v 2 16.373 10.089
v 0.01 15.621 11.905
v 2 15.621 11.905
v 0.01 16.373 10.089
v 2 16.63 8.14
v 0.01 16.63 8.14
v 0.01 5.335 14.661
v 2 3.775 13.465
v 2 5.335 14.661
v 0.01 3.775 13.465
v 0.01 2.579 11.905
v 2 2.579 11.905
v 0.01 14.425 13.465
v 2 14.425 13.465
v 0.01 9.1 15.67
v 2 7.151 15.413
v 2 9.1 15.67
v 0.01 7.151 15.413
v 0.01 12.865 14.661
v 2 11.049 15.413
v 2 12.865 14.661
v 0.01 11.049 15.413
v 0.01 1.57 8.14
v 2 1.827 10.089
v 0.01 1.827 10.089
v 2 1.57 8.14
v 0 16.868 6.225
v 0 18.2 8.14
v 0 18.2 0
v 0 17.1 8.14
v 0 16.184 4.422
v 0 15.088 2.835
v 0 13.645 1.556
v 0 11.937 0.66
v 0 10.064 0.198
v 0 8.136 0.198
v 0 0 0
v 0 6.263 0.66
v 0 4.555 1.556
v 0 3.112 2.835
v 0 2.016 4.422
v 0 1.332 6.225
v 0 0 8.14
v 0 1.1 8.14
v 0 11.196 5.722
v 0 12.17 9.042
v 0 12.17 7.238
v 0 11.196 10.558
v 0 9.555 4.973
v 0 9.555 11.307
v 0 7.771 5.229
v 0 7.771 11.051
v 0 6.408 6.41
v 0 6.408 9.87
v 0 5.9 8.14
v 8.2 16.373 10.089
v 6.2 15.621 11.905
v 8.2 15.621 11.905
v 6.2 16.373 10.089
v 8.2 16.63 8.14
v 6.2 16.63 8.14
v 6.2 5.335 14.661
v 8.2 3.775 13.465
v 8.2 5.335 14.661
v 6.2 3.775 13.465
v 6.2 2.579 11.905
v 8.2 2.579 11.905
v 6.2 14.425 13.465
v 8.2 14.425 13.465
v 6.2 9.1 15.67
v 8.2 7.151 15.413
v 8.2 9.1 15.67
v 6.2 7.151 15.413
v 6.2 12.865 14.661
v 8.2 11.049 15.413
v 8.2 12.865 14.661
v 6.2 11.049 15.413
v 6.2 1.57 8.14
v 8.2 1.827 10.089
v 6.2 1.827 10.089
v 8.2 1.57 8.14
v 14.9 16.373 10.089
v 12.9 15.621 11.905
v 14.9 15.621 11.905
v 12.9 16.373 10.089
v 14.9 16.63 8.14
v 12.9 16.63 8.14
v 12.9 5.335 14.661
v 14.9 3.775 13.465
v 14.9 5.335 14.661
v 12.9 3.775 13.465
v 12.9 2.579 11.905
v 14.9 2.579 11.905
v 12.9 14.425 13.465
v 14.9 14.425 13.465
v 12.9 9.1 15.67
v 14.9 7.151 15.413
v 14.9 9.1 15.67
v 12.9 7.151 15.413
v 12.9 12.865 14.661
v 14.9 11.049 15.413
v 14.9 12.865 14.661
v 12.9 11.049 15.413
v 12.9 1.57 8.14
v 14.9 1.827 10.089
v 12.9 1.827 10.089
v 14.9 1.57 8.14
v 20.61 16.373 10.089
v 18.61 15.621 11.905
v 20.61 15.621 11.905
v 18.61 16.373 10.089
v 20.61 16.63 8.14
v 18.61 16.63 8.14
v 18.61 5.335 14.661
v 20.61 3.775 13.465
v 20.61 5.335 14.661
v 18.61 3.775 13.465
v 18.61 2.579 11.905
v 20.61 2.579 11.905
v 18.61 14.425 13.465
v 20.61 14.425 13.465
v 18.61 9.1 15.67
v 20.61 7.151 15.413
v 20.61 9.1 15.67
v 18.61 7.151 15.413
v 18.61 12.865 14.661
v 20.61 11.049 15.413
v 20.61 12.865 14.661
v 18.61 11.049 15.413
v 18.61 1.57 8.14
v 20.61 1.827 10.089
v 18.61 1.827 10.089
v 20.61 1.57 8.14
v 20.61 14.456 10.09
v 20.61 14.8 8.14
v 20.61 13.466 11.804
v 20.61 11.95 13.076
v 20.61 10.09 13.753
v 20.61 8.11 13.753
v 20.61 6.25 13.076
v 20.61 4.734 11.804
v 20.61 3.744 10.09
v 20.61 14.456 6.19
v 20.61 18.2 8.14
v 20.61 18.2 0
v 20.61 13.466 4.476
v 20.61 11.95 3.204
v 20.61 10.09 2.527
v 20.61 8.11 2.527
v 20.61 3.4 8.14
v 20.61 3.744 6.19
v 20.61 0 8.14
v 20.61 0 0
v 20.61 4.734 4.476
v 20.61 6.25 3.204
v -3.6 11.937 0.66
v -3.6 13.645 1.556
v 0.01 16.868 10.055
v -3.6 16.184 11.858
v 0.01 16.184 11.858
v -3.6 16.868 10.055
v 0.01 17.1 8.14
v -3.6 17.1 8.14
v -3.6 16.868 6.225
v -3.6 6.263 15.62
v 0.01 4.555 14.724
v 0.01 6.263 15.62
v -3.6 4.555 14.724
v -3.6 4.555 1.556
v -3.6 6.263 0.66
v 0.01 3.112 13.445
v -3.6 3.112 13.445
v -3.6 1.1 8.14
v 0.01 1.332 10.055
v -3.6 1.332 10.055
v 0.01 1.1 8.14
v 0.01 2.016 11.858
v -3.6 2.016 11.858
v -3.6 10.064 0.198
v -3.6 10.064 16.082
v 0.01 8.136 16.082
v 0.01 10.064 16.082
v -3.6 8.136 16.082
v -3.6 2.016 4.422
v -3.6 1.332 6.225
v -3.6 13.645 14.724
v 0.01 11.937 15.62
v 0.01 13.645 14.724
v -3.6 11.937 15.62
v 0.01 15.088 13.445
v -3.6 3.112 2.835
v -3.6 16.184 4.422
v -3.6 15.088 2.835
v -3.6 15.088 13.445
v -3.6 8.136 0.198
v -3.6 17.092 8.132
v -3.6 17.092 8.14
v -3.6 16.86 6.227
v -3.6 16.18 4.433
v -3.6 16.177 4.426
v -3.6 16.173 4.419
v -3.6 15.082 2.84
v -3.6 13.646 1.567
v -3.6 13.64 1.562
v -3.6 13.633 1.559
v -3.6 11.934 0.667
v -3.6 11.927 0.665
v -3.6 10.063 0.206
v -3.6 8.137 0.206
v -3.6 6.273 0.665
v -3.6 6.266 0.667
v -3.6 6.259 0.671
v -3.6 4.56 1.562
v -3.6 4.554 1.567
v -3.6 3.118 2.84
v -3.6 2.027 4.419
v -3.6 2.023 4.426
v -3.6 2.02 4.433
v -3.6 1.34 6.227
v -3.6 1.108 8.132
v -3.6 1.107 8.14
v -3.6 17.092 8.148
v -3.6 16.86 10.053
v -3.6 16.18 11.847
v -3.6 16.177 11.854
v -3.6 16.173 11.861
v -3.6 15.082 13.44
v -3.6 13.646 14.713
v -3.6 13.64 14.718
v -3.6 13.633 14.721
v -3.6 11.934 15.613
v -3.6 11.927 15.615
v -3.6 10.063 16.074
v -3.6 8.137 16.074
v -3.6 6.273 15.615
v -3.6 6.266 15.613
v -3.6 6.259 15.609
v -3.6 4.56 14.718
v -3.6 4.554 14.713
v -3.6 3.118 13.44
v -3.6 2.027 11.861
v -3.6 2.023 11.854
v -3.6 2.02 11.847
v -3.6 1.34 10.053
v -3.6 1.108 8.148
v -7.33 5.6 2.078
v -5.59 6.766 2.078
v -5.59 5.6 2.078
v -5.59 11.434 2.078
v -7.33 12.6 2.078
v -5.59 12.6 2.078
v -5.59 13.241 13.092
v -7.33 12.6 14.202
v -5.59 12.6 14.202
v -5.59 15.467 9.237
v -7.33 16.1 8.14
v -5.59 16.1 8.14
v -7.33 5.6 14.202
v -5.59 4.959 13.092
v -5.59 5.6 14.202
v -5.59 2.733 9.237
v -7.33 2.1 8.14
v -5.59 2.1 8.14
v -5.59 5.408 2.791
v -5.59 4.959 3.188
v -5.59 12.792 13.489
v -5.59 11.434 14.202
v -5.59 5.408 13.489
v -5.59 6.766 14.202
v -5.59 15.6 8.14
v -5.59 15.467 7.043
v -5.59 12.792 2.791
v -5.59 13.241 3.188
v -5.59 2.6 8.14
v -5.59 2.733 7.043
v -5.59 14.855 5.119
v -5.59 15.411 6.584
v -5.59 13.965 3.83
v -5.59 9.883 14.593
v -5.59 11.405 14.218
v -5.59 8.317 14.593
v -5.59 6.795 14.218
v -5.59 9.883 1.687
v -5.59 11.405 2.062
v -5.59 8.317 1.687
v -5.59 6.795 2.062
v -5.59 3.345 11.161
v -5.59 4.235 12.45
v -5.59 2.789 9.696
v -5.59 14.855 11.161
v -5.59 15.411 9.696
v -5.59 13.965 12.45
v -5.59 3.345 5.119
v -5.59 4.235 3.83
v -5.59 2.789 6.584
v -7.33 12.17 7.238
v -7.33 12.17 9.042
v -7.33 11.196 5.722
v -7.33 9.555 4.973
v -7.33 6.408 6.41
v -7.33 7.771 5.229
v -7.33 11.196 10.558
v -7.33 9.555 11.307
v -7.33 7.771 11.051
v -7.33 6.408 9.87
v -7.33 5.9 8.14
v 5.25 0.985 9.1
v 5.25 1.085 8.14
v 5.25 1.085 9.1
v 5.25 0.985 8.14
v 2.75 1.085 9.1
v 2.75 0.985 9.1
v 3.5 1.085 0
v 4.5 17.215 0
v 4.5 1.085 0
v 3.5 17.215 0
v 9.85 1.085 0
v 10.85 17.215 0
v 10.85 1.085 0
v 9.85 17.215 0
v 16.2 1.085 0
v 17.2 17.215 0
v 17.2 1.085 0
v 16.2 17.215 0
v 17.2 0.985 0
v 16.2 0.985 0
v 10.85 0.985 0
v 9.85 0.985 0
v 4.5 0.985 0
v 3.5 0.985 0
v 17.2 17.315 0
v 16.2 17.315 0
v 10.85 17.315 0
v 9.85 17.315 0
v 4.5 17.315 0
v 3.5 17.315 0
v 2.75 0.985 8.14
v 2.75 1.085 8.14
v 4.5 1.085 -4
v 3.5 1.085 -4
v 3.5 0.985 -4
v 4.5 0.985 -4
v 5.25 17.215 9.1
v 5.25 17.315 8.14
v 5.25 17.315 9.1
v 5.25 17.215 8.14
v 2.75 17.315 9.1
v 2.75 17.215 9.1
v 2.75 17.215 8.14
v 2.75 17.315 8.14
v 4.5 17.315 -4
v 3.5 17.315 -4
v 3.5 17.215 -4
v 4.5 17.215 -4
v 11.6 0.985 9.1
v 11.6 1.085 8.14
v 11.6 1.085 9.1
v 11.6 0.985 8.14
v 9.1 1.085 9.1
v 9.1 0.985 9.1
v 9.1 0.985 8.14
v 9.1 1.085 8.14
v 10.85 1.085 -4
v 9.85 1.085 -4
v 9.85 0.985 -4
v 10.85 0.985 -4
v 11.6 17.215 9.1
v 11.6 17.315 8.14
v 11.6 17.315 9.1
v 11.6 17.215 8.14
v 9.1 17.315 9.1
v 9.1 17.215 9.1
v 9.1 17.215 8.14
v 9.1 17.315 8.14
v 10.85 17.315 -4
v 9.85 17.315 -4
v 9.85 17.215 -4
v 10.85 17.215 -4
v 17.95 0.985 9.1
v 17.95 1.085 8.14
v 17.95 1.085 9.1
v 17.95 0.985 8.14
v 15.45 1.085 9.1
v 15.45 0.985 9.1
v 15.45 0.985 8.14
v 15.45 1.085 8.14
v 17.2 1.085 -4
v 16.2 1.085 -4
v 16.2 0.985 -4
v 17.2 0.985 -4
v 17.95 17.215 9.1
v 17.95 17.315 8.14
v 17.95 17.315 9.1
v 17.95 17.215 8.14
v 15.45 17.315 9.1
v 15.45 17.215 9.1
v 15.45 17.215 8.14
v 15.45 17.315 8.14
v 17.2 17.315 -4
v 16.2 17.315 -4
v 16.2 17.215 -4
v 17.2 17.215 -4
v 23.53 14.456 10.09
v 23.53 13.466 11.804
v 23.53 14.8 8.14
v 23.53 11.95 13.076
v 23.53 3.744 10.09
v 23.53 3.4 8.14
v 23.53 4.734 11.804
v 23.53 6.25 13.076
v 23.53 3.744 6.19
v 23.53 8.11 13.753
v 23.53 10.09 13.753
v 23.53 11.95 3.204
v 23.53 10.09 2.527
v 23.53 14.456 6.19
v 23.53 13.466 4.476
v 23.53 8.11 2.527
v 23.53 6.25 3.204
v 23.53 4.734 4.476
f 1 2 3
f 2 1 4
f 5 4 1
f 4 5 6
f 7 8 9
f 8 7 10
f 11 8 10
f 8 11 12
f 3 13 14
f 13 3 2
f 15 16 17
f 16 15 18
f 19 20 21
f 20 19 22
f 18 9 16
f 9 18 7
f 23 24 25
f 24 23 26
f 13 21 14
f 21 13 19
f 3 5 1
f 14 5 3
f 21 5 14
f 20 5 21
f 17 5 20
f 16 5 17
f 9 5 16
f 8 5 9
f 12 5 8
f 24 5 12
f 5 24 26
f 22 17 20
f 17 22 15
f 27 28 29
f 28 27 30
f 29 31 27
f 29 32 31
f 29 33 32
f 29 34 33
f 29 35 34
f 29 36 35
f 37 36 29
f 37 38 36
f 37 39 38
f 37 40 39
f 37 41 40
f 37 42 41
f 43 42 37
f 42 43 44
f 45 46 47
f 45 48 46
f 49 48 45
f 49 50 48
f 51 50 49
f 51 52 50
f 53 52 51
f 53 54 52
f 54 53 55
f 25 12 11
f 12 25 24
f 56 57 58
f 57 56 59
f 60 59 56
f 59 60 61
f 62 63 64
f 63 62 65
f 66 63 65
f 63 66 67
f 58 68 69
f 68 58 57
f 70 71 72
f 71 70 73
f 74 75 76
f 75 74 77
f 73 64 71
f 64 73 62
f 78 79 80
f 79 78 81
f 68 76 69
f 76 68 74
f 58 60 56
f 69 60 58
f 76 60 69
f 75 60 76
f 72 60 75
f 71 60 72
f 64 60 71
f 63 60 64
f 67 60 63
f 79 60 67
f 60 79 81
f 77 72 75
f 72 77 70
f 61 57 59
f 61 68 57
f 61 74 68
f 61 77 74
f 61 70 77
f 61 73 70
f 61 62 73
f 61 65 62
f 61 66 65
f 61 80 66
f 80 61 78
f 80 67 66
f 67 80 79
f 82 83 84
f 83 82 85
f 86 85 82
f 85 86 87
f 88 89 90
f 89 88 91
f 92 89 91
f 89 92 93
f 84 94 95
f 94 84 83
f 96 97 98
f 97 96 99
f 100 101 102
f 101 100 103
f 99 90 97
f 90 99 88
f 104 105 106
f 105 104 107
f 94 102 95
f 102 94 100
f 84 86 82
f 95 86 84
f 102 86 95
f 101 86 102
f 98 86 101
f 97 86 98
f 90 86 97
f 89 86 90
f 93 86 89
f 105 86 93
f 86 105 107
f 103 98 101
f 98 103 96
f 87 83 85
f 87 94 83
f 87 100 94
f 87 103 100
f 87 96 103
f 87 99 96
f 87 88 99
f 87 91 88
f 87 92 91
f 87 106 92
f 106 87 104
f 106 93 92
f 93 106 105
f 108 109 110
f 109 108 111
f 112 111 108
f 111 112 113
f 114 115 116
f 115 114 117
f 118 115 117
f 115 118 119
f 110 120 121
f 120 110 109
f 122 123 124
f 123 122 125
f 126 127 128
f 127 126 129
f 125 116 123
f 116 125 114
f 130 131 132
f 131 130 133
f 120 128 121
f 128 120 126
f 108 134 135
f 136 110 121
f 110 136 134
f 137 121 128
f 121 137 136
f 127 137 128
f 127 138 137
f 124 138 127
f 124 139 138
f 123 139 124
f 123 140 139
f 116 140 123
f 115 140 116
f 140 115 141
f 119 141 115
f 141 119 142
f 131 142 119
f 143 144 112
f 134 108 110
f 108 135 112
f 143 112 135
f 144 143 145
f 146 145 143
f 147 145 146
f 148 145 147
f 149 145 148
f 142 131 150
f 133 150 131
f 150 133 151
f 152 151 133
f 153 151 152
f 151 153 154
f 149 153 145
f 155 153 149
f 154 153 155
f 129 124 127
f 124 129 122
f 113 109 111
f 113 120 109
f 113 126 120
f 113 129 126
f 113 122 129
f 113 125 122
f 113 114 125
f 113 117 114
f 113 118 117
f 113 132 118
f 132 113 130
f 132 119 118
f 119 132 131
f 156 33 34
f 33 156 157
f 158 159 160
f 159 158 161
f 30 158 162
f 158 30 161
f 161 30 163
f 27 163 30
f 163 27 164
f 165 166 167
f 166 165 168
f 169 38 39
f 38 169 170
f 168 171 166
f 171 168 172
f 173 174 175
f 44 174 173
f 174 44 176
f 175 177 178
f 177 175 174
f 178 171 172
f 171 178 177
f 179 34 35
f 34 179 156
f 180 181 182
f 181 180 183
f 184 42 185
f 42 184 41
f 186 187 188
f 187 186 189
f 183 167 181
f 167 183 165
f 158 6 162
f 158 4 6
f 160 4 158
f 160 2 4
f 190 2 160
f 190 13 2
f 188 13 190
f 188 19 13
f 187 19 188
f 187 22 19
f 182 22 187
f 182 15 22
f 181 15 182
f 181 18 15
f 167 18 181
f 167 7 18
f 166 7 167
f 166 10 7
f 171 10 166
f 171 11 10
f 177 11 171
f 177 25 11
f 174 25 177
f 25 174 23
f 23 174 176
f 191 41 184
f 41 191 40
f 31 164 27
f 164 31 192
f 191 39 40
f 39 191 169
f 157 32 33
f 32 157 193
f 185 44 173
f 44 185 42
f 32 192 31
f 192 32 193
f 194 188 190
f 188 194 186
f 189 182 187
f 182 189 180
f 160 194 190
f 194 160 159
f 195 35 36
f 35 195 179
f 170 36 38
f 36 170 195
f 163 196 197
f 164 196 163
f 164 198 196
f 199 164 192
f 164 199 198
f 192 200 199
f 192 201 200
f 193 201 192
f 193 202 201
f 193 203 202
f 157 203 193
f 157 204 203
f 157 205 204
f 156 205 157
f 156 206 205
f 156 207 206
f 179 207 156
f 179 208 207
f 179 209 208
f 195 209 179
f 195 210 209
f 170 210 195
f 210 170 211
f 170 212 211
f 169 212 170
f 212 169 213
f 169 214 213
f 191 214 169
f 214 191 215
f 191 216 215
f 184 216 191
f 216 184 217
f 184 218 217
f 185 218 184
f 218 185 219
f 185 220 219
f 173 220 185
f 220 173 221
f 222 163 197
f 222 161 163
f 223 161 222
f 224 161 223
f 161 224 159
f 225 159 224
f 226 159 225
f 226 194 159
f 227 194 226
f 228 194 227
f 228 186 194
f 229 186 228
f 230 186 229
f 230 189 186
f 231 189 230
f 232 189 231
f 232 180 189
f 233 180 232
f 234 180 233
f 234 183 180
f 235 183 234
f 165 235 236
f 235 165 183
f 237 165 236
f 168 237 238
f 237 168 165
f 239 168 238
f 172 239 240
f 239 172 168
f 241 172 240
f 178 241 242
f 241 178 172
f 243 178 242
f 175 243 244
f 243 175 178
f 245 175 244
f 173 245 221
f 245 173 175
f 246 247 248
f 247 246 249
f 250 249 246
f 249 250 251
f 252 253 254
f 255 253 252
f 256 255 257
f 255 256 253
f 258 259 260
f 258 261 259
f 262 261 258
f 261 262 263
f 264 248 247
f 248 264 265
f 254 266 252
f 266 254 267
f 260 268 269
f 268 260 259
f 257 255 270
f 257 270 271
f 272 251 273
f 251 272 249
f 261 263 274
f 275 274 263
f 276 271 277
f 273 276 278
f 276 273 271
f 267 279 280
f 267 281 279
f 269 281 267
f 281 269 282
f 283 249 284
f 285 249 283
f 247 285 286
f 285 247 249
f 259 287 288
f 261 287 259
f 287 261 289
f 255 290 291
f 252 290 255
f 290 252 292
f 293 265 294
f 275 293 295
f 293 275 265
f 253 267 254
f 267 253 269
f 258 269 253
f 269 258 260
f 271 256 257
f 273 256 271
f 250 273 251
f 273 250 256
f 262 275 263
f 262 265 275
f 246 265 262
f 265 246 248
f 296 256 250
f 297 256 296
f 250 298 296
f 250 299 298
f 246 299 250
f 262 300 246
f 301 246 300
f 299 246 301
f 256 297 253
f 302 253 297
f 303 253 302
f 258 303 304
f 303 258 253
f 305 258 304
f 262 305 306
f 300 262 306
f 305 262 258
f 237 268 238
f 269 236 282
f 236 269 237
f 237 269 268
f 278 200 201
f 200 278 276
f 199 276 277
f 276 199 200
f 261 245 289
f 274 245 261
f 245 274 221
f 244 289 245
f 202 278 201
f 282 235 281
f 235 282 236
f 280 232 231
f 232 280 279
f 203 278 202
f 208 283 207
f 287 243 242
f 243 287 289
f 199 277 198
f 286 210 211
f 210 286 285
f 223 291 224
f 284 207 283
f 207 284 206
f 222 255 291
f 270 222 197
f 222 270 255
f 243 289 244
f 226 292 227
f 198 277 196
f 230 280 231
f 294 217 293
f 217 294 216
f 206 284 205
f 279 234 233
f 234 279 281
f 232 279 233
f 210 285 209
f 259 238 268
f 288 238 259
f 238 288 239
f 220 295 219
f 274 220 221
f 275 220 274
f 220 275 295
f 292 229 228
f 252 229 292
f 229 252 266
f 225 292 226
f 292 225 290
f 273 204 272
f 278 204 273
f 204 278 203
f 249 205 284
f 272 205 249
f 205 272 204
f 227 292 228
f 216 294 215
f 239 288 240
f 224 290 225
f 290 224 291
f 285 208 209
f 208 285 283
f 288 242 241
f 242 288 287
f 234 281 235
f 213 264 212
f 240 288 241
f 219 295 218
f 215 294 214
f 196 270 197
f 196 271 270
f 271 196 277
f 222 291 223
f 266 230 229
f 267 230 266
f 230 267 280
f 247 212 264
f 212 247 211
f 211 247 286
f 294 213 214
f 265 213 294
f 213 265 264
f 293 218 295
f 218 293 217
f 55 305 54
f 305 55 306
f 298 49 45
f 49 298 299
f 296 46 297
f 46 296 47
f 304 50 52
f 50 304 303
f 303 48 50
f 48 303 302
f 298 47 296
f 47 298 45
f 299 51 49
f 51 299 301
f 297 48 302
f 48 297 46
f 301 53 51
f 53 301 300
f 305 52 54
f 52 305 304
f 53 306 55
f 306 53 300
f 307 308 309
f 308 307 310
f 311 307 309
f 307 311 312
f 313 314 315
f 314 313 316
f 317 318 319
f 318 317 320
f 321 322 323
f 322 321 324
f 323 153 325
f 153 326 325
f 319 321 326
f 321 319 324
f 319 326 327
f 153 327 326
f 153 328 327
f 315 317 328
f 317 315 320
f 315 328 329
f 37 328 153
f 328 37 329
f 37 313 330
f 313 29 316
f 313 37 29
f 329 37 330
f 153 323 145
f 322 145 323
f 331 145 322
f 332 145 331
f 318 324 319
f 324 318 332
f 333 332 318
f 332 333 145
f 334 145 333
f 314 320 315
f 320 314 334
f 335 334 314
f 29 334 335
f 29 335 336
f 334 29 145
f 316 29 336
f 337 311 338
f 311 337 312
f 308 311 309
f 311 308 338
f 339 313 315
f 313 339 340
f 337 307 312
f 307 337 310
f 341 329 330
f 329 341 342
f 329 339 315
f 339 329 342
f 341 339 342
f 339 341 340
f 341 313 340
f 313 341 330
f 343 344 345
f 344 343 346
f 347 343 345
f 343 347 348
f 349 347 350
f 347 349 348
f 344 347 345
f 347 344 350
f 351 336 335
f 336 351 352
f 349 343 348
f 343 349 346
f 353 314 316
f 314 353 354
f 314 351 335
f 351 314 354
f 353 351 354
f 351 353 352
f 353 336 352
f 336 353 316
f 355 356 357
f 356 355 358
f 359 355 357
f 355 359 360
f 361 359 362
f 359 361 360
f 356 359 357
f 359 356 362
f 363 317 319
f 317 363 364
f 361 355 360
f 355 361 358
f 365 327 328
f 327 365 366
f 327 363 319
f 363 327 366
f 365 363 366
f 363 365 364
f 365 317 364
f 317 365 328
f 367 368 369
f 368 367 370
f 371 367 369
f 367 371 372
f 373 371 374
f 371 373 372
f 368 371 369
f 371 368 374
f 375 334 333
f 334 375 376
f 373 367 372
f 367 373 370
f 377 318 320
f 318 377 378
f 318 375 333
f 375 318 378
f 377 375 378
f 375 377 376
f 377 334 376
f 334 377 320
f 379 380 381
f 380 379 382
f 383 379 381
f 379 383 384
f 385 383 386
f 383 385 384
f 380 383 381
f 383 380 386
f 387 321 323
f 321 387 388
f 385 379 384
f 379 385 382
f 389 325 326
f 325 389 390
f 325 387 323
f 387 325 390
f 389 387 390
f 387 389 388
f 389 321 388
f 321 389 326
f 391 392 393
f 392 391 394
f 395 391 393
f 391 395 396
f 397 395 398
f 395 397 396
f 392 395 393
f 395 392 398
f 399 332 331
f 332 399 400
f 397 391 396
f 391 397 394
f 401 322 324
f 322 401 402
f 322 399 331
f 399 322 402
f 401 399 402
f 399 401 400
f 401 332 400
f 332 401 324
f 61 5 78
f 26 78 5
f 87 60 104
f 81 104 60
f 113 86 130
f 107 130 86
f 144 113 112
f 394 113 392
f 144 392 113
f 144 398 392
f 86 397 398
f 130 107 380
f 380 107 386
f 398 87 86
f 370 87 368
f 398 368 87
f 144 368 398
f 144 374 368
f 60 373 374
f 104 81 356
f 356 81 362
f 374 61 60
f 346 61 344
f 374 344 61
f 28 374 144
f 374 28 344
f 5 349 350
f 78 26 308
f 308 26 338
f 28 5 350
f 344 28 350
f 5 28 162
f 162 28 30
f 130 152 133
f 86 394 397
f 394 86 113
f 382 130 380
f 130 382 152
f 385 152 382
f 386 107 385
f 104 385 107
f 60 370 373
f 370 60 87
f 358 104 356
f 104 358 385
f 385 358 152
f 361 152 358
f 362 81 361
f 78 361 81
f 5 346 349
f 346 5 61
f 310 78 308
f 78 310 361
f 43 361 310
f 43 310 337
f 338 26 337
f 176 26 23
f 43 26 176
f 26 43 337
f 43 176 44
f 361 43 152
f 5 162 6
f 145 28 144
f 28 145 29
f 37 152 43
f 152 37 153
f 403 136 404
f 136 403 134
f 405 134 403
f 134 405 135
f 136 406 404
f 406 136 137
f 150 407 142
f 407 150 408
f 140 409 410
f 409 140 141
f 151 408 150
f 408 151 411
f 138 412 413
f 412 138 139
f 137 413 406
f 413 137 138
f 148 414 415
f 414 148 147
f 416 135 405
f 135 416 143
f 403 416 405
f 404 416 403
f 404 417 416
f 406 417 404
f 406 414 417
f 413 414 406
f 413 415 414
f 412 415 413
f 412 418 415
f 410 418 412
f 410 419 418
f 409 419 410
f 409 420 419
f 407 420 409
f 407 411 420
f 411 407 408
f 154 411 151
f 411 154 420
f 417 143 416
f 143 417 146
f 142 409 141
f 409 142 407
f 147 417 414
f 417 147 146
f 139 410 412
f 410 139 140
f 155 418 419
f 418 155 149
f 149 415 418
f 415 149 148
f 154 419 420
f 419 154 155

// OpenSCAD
/* 2014 Don Bosley : 
Neutrik Jack Set V 0.0
For updates/corrections email : don@bosleymusic.com
Mechanical Drawing
Compatible with Neutrik products : 
- stereo jack, switched, chrome ferrule and straight PCB pins

NMJ6HDC2

*/

//MAIN BODY
translate([0,0,0])
color("black") 
cube([20.61,18.2,8.14]); 

//FRONT 

//BODY SECTIONS
for (i = [ [0,9.1,8.14],
		   [6.2,9.1,8.14],
		   [12.9,9.1,8.14],
		   [18.61,9.1,8.14],
])
{
	color("black")
	translate(i)
	rotate([90,0,90])
	cylinder(r=15.67-8.14, h=2); 
}

//REAR CYLINDER
color("black")
translate([20.60,9.1,8.14])
rotate([90,0,90]) 
cylinder(r=5.7,h=23.53-20.60);


difference(){
	union(){
		//NUT
		color("lightgrey")
		translate([-5.59, 9.1,8.14])
		rotate([90,0,-90])
		cylinder(r=7,h=1.74, $fn=6); 
		//FRONT WASHERS
		for (i = [ [-1.2,9.1,8.14],
		 		  [-2.4,9.1,8.14],
				  [-3.6,9.1,8.14]
 		])
		{
			color("black")
			translate(i)
			rotate([90,0,90])
			cylinder(r=8, h=1.21); 
		}
		//FRONT BEVEL
		color("black")
		translate([-3.59, 9.1,8.14])
		rotate([90,0,-90])
		cylinder(r2=6.5, r1=8,h=2); 
	}
//NUTHOLE
color("black")
translate([8, 9.1,8.14])
rotate([90,0,-90])
cylinder(r=3.2,h=24); 
}

/*ENSURE PIN CENTERS ARE ALIGNED (COMMENT OUT)
for (i = [  [4,2.23/2,-2],//S
		   [4,18.2-2.23/2,-2],//SN
		   [16.7,2.23/2,-2],//T
		   [16.7,18.2-2.23/2,-2],//TN

 ])
{
	translate(i)
	color("blue")
	cylinder(r=.7, h=9);
}
*/

//PINS 
for(i = [
	     [4-1.25,.985,0],//S
		 [4-1.25,18.2-.985,0],//SN
		 [10.35-1.25,.985,0],//R
		 [10.35-1.25,18.2-.985,0],//RN
	     [16.7-1.25,.985,0],//T
		 [16.7-1.25,18.2-.985,0],//TN

])
{
	translate(i)
	color("lightgrey") 
	union(){cube([2.5,.1,9.1]); 
 	translate([.75,0,-4])
	cube([1,.1,4]);}
}
